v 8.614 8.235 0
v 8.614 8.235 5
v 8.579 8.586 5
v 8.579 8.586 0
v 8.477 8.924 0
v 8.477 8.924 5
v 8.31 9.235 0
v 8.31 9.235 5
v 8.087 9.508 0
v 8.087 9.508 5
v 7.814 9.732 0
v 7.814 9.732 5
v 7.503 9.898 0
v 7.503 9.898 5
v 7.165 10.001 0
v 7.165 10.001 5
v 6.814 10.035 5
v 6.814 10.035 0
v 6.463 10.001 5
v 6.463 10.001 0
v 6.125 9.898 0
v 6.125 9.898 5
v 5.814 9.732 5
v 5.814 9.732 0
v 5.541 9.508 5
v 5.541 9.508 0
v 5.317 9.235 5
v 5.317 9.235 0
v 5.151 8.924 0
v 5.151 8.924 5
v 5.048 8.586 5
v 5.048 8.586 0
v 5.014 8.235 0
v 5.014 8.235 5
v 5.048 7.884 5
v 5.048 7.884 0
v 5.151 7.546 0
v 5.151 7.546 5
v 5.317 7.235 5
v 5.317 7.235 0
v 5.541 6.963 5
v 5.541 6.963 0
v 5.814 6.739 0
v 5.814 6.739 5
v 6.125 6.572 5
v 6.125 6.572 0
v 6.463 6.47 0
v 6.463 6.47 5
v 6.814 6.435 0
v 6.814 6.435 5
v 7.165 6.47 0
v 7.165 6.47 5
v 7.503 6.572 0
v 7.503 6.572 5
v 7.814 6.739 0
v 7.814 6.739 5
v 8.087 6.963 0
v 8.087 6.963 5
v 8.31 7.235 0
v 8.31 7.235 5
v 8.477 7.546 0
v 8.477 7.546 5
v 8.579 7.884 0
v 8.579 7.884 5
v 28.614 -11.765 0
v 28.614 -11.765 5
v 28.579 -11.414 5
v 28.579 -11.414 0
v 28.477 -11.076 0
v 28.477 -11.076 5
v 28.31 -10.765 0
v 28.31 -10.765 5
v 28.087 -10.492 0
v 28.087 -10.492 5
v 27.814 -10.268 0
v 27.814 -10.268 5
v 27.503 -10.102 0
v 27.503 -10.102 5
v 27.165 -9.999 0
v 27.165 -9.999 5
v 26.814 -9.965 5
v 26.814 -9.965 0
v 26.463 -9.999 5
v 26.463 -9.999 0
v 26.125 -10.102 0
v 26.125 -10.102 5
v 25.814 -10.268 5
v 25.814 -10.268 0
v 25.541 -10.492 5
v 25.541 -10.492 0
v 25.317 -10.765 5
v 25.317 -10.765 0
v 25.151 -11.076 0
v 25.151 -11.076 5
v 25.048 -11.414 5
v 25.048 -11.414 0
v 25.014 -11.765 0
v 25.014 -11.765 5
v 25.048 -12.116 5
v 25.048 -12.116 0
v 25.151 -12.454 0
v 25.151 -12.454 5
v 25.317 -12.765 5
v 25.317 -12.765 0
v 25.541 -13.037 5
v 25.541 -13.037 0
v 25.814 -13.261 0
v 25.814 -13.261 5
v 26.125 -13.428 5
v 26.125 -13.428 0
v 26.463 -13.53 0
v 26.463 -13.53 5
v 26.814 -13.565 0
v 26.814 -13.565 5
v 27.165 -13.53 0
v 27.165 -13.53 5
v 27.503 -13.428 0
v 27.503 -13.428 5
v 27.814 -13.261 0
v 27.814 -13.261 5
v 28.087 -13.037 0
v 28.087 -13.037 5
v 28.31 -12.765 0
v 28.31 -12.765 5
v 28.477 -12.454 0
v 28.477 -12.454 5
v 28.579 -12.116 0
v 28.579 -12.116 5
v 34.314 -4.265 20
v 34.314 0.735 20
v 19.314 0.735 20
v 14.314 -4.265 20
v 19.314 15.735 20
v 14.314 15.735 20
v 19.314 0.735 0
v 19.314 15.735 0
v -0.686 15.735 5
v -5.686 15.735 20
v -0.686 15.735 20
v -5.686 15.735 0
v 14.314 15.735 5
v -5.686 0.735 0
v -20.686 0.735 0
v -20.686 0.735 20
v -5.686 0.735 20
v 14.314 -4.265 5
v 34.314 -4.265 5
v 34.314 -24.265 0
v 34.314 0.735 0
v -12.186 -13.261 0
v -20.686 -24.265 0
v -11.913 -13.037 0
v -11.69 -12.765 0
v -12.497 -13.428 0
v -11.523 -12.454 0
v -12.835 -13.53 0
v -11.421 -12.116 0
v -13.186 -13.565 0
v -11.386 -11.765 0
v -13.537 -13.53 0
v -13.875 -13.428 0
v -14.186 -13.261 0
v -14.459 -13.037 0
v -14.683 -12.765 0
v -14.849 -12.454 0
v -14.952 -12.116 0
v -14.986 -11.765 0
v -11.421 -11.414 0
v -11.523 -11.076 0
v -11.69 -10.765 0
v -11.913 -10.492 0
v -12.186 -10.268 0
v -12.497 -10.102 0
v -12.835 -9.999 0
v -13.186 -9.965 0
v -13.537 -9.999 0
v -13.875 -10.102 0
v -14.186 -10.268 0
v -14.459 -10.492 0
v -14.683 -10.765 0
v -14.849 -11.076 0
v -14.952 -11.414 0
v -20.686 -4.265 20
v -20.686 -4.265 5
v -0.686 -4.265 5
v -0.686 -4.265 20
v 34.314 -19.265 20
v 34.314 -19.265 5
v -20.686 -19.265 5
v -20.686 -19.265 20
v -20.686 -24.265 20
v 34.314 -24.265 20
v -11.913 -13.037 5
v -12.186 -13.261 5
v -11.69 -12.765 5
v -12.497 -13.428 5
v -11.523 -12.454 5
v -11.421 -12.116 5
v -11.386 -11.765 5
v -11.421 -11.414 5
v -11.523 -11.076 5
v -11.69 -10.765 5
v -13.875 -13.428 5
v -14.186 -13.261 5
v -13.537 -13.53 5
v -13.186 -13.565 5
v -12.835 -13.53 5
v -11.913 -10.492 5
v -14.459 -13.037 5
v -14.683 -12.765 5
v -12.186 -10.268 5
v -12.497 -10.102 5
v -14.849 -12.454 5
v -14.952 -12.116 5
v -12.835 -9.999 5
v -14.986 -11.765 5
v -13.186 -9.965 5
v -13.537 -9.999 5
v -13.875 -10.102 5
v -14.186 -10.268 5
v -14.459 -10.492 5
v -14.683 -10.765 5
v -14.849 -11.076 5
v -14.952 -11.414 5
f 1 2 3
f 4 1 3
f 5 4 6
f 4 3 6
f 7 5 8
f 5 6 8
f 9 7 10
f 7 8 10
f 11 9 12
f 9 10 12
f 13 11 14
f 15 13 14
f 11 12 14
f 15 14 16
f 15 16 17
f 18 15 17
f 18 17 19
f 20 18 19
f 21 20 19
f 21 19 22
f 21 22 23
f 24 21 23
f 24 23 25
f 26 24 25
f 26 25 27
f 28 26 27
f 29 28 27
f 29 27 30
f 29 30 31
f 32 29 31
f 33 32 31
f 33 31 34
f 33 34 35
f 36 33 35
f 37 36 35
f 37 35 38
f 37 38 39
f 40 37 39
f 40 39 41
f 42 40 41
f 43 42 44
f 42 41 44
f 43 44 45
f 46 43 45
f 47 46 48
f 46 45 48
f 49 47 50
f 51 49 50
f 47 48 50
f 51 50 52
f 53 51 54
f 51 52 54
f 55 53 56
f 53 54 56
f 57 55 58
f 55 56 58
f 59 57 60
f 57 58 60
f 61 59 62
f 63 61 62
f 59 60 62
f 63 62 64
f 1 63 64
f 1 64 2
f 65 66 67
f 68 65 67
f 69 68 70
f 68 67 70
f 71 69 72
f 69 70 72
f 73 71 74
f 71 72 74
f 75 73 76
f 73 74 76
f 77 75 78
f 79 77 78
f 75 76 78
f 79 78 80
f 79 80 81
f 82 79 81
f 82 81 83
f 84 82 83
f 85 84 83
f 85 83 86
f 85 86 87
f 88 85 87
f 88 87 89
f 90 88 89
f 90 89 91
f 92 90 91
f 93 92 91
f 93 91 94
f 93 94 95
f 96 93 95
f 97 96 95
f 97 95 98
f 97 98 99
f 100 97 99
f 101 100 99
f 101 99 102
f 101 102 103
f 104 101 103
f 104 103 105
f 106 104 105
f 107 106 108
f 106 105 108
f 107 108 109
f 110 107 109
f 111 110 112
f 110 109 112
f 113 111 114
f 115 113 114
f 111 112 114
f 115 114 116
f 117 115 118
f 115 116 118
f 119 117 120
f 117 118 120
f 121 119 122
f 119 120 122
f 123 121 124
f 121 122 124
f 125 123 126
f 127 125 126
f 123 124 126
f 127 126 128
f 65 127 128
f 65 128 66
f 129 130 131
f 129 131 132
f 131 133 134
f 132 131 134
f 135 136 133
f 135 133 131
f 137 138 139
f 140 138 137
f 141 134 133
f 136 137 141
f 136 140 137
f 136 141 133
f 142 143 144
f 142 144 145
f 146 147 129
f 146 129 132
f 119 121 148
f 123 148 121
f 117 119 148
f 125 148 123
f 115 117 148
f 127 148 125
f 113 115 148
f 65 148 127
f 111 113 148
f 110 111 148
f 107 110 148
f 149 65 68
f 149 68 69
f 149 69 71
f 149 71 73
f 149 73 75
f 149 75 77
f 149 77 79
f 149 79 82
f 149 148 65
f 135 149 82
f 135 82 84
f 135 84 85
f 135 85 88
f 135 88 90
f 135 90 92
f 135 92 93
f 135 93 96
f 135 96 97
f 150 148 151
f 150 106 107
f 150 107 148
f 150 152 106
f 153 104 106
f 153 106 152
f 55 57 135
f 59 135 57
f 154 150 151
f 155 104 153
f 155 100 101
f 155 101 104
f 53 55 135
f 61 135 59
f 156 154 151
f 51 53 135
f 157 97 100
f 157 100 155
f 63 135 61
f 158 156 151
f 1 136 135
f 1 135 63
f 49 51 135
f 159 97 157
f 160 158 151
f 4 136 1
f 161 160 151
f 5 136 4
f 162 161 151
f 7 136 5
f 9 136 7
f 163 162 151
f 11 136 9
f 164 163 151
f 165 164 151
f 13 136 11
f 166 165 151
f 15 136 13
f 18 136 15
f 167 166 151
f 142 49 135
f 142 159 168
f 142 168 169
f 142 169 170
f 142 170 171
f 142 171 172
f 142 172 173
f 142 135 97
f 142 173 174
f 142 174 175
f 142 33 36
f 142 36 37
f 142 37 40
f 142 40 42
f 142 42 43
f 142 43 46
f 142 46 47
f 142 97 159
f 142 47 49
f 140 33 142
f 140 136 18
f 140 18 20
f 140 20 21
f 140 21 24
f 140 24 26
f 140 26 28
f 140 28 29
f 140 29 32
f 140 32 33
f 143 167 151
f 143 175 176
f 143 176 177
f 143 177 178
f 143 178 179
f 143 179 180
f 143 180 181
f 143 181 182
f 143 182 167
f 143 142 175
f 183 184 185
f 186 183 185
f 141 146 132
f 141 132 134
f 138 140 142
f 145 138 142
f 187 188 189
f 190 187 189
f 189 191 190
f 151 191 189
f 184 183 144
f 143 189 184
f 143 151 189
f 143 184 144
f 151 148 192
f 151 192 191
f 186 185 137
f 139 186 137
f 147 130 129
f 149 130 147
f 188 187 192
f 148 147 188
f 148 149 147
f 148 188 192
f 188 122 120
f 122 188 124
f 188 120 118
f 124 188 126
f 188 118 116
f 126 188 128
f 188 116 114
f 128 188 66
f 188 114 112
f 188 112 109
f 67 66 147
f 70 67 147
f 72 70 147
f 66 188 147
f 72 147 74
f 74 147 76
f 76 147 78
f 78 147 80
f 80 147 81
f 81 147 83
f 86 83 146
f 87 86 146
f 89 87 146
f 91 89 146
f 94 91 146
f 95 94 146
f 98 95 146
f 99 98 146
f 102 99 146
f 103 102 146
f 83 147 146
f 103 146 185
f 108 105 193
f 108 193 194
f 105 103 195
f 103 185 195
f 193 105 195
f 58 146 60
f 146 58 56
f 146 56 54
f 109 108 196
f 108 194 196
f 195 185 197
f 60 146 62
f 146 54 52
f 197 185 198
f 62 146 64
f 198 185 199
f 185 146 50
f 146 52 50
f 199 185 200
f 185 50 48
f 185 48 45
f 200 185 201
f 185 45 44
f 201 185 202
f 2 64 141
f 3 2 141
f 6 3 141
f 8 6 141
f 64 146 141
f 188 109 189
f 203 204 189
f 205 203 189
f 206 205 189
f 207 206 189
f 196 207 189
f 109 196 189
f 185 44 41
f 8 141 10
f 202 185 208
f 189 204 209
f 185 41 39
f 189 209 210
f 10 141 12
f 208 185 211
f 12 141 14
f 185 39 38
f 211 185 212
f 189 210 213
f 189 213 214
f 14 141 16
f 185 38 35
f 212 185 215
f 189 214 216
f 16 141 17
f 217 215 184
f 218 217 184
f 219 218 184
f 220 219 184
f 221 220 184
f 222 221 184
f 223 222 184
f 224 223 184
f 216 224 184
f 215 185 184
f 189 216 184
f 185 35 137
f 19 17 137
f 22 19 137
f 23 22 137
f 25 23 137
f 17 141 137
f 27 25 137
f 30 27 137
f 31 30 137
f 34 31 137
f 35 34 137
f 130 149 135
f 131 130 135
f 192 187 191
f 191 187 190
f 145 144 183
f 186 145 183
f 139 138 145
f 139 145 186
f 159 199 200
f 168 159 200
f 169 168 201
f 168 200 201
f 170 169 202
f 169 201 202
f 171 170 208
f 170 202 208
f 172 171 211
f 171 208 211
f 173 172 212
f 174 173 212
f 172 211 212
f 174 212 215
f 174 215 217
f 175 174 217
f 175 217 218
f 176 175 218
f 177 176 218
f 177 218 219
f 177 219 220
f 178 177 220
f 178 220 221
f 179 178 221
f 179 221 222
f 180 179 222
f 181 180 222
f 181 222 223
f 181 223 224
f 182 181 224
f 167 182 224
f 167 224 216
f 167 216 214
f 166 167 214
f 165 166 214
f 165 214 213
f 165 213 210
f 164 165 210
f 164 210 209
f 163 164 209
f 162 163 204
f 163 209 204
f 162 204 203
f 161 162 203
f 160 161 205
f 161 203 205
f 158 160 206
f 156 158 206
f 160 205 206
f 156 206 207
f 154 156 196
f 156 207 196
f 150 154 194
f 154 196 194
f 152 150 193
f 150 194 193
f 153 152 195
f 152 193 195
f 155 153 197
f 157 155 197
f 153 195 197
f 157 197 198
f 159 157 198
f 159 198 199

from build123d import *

# Parameters (mm, degrees)
BOSS_EXTRUDE1_DEPTH = 5
BOSS_EXTRUDE2_DEPTH = 20
SKETCH4_W           = 55
SKETCH4_H           = 5
BOSS_EXTRUDE3_DEPTH = 20
SKETCH6_R           = 1.8
CUT_EXTRUDE3_DEPTH  = 6


with BuildPart() as part:
    # Sketch1 → Boss-Extrude1 (new body)
    with BuildSketch(Plane.XY):
        Polygon((14.31372549, -4.264705882), (34.31372549, -4.264705882), (34.31372549, -19.264705882), (-20.68627451, -19.264705882), (-20.68627451, -4.264705882), (-0.68627451, -4.264705882), (-0.68627451, 15.735294118), (14.31372549, 15.735294118), align=None)
    extrude(amount=BOSS_EXTRUDE1_DEPTH)

    # Sketch2 → Boss-Extrude2 (add)
    with BuildSketch(Plane(origin=(0, 0, 0), x_dir=(-1, 0, 0), z_dir=(0, 0, -1))):
        Polygon((0.68627451, 15.735294118), (5.68627451, 15.735294118), (5.68627451, 0.735294118), (6.079970528, 0.735294118), (20.68627451, 0.735294118), (20.68627451, -4.264705882), (0.68627451, -4.264705882), align=None)
    boss_extrude2 = extrude(amount=-BOSS_EXTRUDE2_DEPTH)

    # Sketch4 → Boss-Extrude3 (add)
    with BuildSketch(Plane(origin=(0, 0, 0), x_dir=(-1, 0, 0), z_dir=(0, 0, -1))):
        with Locations((-6.81372549, -21.764705882)):
            Rectangle(SKETCH4_W, SKETCH4_H)
    extrude(amount=-BOSS_EXTRUDE3_DEPTH)

    # Mirror1: Boss-Extrude2 across plane
    add(boss_extrude2.mirror(Plane.ZY.offset(-6.81372549)))

    # Sketch6 → Cut-Extrude3 (cut, through all)
    with BuildSketch(Plane.XY.offset(5)):
        with Locations((6.81372549, 8.235294118)):
            Circle(SKETCH6_R)
        with Locations((-13.18627451, -11.764705882)):
            Circle(SKETCH6_R)
        with Locations((26.81372549, -11.764705882)):
            Circle(SKETCH6_R)
    extrude(amount=-CUT_EXTRUDE3_DEPTH, mode=Mode.SUBTRACT)


solid = part.part
